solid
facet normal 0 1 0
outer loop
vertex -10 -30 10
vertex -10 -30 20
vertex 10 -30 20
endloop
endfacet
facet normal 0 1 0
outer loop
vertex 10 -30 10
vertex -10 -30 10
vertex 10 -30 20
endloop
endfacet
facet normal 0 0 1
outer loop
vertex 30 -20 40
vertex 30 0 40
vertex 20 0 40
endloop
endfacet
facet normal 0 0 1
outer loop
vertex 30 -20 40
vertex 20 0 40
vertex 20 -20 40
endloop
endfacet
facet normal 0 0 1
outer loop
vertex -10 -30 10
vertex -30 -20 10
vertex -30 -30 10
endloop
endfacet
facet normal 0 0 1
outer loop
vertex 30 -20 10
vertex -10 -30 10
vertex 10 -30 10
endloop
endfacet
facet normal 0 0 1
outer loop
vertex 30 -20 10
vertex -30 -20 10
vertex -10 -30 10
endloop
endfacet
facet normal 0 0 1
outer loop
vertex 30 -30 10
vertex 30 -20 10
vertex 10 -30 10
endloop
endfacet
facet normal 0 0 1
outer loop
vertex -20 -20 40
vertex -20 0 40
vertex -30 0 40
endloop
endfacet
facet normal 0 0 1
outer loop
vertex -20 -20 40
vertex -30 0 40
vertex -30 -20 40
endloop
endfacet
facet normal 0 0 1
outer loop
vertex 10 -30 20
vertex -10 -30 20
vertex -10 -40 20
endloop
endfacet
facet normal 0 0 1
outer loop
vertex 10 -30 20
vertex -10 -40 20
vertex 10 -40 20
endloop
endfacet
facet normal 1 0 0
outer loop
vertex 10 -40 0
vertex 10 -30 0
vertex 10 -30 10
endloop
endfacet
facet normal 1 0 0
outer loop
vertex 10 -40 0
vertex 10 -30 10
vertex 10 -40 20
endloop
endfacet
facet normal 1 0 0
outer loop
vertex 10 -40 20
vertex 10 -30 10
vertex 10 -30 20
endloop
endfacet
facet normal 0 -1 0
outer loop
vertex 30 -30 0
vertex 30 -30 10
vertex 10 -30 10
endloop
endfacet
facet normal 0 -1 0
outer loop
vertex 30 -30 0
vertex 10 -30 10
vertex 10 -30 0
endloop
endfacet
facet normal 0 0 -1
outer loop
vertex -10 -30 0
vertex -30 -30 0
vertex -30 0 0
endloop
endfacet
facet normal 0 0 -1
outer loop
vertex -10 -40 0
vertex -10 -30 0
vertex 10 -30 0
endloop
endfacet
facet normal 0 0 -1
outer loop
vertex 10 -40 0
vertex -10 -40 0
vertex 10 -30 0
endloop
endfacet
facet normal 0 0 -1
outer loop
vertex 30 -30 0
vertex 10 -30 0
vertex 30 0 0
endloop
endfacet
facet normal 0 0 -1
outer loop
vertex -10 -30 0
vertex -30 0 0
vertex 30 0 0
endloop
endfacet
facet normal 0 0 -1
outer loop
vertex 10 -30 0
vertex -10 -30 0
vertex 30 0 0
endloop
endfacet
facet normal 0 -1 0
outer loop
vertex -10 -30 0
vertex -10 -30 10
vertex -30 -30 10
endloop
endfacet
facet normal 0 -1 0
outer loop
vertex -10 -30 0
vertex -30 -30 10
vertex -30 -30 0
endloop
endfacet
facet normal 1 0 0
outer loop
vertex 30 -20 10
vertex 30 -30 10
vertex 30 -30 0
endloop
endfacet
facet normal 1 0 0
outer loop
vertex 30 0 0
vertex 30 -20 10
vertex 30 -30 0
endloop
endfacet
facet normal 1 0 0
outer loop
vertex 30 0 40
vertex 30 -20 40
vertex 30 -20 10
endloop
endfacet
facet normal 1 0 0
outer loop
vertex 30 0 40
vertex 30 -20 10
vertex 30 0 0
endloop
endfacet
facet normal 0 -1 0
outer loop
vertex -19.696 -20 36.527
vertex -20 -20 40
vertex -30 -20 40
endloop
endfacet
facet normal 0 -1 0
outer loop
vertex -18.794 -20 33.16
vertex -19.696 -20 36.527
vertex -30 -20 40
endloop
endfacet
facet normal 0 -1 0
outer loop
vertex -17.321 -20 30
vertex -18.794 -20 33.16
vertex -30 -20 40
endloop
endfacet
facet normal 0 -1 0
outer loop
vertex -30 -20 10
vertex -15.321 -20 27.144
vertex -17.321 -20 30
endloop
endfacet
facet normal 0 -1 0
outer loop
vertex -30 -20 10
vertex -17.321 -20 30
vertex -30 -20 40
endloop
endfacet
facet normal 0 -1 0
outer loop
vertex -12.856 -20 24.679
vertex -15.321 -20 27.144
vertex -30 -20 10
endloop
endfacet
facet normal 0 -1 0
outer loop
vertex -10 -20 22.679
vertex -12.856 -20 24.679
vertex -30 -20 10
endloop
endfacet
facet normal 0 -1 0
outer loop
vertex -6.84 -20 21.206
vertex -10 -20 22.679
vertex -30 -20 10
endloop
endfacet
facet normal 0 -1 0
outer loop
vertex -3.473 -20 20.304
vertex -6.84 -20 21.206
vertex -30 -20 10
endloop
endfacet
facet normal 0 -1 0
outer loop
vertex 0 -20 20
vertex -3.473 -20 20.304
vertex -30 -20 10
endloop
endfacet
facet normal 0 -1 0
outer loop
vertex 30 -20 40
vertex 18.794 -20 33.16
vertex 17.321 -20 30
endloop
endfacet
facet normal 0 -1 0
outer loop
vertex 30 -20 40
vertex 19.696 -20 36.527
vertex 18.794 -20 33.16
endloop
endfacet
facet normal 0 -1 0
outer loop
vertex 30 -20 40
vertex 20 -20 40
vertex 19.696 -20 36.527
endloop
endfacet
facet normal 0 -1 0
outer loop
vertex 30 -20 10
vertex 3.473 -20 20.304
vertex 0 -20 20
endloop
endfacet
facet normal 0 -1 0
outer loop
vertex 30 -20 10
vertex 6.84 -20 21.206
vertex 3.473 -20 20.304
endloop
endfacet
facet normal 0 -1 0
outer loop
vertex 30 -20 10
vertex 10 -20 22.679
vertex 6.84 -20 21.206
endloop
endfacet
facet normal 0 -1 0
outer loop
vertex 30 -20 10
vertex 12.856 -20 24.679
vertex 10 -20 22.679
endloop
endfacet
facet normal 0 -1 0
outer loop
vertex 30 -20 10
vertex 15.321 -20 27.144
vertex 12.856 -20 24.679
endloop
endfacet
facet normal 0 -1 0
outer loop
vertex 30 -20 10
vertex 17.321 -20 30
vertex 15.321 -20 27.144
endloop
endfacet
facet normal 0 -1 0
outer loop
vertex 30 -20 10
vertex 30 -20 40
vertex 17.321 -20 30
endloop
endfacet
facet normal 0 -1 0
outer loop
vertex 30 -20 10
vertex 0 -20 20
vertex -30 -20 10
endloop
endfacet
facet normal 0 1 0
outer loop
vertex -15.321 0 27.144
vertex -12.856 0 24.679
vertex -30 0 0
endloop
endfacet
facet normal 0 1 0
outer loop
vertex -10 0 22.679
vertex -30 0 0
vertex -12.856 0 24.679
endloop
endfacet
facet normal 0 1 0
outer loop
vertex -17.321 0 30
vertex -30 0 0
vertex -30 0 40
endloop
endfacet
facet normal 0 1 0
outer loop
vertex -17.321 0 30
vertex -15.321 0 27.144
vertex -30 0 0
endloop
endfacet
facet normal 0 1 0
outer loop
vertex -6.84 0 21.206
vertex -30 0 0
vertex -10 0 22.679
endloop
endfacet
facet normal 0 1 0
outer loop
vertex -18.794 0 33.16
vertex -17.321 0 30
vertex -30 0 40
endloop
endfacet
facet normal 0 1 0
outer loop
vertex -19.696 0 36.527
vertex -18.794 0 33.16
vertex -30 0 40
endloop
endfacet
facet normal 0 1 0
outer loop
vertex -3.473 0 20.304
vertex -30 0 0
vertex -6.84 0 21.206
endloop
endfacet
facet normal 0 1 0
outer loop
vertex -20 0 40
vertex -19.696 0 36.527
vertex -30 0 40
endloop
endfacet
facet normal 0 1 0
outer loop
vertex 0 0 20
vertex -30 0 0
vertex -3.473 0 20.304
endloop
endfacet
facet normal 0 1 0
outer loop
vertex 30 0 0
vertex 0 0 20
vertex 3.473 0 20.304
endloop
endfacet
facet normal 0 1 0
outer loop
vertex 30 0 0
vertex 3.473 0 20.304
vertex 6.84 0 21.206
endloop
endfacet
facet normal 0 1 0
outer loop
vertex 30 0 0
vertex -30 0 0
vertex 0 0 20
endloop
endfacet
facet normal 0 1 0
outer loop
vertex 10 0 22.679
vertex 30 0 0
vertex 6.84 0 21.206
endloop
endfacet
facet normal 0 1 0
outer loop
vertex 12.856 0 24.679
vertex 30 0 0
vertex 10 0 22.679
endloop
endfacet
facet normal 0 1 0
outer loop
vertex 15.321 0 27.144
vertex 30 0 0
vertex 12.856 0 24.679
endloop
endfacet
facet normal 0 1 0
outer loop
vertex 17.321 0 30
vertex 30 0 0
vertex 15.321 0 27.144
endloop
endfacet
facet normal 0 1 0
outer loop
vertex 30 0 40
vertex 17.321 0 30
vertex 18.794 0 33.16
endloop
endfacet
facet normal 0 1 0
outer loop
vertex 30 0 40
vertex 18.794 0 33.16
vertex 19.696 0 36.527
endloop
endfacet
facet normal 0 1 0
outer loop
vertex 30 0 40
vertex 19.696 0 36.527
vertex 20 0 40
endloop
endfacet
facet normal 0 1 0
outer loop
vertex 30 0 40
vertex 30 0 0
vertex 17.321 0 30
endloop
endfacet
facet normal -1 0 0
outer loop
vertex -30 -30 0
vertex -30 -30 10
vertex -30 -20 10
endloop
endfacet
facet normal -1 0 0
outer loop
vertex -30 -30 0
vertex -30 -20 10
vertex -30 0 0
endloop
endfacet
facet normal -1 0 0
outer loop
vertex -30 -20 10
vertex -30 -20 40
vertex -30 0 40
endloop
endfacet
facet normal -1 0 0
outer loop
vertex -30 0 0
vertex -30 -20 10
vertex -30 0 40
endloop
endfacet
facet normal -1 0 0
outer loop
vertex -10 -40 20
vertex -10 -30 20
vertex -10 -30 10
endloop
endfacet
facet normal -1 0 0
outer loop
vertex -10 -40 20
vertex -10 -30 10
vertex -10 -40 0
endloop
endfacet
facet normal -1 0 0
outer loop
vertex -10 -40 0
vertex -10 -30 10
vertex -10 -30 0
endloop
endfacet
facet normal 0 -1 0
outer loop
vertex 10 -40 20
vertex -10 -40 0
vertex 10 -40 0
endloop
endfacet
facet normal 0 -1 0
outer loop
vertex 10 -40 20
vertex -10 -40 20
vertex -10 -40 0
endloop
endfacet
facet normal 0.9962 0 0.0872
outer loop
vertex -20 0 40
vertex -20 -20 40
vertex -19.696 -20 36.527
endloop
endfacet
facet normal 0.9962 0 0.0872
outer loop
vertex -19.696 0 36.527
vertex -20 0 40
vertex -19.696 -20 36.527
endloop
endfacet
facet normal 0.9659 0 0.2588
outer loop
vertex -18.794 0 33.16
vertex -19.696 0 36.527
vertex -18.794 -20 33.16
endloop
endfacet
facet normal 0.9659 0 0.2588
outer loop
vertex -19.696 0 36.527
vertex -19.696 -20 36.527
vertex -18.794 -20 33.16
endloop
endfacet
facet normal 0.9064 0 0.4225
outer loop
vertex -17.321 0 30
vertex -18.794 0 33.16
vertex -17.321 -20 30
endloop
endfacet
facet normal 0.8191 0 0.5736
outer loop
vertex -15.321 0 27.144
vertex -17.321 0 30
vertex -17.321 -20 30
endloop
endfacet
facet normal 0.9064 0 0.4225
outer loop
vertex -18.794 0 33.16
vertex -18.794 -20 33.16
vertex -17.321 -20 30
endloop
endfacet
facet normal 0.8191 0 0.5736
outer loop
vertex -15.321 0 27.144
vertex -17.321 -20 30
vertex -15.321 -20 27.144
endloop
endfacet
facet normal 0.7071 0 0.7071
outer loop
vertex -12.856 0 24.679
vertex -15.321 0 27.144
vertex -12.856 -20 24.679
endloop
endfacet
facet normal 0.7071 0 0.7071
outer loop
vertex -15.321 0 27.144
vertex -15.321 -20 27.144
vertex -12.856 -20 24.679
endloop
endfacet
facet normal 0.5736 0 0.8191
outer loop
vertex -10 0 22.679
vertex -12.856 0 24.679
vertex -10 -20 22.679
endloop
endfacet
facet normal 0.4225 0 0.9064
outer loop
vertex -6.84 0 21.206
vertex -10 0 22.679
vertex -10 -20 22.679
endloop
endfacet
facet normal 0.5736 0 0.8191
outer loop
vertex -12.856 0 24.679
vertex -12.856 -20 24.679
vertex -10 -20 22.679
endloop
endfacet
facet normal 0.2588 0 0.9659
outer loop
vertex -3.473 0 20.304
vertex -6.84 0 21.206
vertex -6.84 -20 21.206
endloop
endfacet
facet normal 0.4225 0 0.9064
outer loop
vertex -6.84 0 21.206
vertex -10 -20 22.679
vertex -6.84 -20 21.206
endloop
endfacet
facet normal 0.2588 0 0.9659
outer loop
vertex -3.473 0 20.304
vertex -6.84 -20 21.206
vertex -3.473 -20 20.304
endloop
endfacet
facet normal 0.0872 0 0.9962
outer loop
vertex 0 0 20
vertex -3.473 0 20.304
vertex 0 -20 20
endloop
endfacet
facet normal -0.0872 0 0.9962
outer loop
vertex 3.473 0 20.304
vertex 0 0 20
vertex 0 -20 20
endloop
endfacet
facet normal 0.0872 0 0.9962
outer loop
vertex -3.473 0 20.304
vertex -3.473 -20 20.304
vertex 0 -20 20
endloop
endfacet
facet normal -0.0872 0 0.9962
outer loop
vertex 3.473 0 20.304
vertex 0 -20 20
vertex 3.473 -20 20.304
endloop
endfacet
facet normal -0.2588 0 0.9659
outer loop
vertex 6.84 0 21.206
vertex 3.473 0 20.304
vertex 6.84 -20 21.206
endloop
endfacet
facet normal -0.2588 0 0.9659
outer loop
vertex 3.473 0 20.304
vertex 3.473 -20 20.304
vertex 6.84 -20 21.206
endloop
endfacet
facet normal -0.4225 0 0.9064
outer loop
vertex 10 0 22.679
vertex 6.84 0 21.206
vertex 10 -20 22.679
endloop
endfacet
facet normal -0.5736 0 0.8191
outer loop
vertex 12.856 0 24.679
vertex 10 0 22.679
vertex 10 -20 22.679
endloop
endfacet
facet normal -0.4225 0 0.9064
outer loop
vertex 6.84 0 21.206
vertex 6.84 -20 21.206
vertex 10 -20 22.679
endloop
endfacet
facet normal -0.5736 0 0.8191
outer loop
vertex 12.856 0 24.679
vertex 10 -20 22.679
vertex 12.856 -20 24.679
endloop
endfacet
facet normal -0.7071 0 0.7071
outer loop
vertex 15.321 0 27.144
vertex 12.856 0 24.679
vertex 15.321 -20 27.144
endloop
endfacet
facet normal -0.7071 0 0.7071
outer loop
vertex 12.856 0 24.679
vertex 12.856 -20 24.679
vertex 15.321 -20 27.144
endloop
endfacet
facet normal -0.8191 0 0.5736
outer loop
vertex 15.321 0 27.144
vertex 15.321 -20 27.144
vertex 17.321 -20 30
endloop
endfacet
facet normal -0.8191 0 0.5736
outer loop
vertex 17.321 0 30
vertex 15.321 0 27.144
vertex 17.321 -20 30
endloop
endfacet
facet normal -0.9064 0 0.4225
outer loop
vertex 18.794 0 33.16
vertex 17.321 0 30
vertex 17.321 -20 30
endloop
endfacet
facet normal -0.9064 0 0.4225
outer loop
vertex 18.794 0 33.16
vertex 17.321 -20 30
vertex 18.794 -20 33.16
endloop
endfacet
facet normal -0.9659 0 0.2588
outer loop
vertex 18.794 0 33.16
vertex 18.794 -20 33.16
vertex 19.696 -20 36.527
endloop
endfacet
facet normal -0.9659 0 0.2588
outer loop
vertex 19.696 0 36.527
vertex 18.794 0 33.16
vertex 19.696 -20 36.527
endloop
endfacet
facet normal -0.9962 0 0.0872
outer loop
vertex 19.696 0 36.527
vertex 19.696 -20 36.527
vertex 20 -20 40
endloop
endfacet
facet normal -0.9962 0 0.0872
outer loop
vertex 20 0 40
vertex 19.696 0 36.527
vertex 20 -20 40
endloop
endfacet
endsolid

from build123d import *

# Parameters (mm, degrees)
F1_DEPTH = 30
F3_DEPTH = 20.001
F4_W     = 20
F4_H     = 10
F5_DEPTH = 10


with BuildPart() as f1:
    # F0 (on Right) → F1 (new body, symmetric)
    with BuildSketch(Plane.YZ):
        Polygon((-30, 0), (0, 0), (0, 40), (-20, 40), (-20, 10), (-30, 10), align=None)
    extrude(amount=F1_DEPTH, both=True)

    # F2 (on face) → F3 (cut, through all)
    with BuildSketch(Plane.XZ.offset(20)):
        with BuildLine():
            Line((20, 40), (-20, 40))
            ThreePointArc((-20, 40), (0, 20), (20, 40))
        make_face()
    extrude(amount=-F3_DEPTH, mode=Mode.SUBTRACT)

    # F4 (on face) → F5 (join)
    with BuildSketch(Plane.XZ.offset(30)):
        with Locations((0, 5)):
            Rectangle(F4_W, F4_H)
        with Locations((0, 15)):
            Rectangle(F4_W, F4_H)
    extrude(amount=F5_DEPTH)


solid = f1.part
